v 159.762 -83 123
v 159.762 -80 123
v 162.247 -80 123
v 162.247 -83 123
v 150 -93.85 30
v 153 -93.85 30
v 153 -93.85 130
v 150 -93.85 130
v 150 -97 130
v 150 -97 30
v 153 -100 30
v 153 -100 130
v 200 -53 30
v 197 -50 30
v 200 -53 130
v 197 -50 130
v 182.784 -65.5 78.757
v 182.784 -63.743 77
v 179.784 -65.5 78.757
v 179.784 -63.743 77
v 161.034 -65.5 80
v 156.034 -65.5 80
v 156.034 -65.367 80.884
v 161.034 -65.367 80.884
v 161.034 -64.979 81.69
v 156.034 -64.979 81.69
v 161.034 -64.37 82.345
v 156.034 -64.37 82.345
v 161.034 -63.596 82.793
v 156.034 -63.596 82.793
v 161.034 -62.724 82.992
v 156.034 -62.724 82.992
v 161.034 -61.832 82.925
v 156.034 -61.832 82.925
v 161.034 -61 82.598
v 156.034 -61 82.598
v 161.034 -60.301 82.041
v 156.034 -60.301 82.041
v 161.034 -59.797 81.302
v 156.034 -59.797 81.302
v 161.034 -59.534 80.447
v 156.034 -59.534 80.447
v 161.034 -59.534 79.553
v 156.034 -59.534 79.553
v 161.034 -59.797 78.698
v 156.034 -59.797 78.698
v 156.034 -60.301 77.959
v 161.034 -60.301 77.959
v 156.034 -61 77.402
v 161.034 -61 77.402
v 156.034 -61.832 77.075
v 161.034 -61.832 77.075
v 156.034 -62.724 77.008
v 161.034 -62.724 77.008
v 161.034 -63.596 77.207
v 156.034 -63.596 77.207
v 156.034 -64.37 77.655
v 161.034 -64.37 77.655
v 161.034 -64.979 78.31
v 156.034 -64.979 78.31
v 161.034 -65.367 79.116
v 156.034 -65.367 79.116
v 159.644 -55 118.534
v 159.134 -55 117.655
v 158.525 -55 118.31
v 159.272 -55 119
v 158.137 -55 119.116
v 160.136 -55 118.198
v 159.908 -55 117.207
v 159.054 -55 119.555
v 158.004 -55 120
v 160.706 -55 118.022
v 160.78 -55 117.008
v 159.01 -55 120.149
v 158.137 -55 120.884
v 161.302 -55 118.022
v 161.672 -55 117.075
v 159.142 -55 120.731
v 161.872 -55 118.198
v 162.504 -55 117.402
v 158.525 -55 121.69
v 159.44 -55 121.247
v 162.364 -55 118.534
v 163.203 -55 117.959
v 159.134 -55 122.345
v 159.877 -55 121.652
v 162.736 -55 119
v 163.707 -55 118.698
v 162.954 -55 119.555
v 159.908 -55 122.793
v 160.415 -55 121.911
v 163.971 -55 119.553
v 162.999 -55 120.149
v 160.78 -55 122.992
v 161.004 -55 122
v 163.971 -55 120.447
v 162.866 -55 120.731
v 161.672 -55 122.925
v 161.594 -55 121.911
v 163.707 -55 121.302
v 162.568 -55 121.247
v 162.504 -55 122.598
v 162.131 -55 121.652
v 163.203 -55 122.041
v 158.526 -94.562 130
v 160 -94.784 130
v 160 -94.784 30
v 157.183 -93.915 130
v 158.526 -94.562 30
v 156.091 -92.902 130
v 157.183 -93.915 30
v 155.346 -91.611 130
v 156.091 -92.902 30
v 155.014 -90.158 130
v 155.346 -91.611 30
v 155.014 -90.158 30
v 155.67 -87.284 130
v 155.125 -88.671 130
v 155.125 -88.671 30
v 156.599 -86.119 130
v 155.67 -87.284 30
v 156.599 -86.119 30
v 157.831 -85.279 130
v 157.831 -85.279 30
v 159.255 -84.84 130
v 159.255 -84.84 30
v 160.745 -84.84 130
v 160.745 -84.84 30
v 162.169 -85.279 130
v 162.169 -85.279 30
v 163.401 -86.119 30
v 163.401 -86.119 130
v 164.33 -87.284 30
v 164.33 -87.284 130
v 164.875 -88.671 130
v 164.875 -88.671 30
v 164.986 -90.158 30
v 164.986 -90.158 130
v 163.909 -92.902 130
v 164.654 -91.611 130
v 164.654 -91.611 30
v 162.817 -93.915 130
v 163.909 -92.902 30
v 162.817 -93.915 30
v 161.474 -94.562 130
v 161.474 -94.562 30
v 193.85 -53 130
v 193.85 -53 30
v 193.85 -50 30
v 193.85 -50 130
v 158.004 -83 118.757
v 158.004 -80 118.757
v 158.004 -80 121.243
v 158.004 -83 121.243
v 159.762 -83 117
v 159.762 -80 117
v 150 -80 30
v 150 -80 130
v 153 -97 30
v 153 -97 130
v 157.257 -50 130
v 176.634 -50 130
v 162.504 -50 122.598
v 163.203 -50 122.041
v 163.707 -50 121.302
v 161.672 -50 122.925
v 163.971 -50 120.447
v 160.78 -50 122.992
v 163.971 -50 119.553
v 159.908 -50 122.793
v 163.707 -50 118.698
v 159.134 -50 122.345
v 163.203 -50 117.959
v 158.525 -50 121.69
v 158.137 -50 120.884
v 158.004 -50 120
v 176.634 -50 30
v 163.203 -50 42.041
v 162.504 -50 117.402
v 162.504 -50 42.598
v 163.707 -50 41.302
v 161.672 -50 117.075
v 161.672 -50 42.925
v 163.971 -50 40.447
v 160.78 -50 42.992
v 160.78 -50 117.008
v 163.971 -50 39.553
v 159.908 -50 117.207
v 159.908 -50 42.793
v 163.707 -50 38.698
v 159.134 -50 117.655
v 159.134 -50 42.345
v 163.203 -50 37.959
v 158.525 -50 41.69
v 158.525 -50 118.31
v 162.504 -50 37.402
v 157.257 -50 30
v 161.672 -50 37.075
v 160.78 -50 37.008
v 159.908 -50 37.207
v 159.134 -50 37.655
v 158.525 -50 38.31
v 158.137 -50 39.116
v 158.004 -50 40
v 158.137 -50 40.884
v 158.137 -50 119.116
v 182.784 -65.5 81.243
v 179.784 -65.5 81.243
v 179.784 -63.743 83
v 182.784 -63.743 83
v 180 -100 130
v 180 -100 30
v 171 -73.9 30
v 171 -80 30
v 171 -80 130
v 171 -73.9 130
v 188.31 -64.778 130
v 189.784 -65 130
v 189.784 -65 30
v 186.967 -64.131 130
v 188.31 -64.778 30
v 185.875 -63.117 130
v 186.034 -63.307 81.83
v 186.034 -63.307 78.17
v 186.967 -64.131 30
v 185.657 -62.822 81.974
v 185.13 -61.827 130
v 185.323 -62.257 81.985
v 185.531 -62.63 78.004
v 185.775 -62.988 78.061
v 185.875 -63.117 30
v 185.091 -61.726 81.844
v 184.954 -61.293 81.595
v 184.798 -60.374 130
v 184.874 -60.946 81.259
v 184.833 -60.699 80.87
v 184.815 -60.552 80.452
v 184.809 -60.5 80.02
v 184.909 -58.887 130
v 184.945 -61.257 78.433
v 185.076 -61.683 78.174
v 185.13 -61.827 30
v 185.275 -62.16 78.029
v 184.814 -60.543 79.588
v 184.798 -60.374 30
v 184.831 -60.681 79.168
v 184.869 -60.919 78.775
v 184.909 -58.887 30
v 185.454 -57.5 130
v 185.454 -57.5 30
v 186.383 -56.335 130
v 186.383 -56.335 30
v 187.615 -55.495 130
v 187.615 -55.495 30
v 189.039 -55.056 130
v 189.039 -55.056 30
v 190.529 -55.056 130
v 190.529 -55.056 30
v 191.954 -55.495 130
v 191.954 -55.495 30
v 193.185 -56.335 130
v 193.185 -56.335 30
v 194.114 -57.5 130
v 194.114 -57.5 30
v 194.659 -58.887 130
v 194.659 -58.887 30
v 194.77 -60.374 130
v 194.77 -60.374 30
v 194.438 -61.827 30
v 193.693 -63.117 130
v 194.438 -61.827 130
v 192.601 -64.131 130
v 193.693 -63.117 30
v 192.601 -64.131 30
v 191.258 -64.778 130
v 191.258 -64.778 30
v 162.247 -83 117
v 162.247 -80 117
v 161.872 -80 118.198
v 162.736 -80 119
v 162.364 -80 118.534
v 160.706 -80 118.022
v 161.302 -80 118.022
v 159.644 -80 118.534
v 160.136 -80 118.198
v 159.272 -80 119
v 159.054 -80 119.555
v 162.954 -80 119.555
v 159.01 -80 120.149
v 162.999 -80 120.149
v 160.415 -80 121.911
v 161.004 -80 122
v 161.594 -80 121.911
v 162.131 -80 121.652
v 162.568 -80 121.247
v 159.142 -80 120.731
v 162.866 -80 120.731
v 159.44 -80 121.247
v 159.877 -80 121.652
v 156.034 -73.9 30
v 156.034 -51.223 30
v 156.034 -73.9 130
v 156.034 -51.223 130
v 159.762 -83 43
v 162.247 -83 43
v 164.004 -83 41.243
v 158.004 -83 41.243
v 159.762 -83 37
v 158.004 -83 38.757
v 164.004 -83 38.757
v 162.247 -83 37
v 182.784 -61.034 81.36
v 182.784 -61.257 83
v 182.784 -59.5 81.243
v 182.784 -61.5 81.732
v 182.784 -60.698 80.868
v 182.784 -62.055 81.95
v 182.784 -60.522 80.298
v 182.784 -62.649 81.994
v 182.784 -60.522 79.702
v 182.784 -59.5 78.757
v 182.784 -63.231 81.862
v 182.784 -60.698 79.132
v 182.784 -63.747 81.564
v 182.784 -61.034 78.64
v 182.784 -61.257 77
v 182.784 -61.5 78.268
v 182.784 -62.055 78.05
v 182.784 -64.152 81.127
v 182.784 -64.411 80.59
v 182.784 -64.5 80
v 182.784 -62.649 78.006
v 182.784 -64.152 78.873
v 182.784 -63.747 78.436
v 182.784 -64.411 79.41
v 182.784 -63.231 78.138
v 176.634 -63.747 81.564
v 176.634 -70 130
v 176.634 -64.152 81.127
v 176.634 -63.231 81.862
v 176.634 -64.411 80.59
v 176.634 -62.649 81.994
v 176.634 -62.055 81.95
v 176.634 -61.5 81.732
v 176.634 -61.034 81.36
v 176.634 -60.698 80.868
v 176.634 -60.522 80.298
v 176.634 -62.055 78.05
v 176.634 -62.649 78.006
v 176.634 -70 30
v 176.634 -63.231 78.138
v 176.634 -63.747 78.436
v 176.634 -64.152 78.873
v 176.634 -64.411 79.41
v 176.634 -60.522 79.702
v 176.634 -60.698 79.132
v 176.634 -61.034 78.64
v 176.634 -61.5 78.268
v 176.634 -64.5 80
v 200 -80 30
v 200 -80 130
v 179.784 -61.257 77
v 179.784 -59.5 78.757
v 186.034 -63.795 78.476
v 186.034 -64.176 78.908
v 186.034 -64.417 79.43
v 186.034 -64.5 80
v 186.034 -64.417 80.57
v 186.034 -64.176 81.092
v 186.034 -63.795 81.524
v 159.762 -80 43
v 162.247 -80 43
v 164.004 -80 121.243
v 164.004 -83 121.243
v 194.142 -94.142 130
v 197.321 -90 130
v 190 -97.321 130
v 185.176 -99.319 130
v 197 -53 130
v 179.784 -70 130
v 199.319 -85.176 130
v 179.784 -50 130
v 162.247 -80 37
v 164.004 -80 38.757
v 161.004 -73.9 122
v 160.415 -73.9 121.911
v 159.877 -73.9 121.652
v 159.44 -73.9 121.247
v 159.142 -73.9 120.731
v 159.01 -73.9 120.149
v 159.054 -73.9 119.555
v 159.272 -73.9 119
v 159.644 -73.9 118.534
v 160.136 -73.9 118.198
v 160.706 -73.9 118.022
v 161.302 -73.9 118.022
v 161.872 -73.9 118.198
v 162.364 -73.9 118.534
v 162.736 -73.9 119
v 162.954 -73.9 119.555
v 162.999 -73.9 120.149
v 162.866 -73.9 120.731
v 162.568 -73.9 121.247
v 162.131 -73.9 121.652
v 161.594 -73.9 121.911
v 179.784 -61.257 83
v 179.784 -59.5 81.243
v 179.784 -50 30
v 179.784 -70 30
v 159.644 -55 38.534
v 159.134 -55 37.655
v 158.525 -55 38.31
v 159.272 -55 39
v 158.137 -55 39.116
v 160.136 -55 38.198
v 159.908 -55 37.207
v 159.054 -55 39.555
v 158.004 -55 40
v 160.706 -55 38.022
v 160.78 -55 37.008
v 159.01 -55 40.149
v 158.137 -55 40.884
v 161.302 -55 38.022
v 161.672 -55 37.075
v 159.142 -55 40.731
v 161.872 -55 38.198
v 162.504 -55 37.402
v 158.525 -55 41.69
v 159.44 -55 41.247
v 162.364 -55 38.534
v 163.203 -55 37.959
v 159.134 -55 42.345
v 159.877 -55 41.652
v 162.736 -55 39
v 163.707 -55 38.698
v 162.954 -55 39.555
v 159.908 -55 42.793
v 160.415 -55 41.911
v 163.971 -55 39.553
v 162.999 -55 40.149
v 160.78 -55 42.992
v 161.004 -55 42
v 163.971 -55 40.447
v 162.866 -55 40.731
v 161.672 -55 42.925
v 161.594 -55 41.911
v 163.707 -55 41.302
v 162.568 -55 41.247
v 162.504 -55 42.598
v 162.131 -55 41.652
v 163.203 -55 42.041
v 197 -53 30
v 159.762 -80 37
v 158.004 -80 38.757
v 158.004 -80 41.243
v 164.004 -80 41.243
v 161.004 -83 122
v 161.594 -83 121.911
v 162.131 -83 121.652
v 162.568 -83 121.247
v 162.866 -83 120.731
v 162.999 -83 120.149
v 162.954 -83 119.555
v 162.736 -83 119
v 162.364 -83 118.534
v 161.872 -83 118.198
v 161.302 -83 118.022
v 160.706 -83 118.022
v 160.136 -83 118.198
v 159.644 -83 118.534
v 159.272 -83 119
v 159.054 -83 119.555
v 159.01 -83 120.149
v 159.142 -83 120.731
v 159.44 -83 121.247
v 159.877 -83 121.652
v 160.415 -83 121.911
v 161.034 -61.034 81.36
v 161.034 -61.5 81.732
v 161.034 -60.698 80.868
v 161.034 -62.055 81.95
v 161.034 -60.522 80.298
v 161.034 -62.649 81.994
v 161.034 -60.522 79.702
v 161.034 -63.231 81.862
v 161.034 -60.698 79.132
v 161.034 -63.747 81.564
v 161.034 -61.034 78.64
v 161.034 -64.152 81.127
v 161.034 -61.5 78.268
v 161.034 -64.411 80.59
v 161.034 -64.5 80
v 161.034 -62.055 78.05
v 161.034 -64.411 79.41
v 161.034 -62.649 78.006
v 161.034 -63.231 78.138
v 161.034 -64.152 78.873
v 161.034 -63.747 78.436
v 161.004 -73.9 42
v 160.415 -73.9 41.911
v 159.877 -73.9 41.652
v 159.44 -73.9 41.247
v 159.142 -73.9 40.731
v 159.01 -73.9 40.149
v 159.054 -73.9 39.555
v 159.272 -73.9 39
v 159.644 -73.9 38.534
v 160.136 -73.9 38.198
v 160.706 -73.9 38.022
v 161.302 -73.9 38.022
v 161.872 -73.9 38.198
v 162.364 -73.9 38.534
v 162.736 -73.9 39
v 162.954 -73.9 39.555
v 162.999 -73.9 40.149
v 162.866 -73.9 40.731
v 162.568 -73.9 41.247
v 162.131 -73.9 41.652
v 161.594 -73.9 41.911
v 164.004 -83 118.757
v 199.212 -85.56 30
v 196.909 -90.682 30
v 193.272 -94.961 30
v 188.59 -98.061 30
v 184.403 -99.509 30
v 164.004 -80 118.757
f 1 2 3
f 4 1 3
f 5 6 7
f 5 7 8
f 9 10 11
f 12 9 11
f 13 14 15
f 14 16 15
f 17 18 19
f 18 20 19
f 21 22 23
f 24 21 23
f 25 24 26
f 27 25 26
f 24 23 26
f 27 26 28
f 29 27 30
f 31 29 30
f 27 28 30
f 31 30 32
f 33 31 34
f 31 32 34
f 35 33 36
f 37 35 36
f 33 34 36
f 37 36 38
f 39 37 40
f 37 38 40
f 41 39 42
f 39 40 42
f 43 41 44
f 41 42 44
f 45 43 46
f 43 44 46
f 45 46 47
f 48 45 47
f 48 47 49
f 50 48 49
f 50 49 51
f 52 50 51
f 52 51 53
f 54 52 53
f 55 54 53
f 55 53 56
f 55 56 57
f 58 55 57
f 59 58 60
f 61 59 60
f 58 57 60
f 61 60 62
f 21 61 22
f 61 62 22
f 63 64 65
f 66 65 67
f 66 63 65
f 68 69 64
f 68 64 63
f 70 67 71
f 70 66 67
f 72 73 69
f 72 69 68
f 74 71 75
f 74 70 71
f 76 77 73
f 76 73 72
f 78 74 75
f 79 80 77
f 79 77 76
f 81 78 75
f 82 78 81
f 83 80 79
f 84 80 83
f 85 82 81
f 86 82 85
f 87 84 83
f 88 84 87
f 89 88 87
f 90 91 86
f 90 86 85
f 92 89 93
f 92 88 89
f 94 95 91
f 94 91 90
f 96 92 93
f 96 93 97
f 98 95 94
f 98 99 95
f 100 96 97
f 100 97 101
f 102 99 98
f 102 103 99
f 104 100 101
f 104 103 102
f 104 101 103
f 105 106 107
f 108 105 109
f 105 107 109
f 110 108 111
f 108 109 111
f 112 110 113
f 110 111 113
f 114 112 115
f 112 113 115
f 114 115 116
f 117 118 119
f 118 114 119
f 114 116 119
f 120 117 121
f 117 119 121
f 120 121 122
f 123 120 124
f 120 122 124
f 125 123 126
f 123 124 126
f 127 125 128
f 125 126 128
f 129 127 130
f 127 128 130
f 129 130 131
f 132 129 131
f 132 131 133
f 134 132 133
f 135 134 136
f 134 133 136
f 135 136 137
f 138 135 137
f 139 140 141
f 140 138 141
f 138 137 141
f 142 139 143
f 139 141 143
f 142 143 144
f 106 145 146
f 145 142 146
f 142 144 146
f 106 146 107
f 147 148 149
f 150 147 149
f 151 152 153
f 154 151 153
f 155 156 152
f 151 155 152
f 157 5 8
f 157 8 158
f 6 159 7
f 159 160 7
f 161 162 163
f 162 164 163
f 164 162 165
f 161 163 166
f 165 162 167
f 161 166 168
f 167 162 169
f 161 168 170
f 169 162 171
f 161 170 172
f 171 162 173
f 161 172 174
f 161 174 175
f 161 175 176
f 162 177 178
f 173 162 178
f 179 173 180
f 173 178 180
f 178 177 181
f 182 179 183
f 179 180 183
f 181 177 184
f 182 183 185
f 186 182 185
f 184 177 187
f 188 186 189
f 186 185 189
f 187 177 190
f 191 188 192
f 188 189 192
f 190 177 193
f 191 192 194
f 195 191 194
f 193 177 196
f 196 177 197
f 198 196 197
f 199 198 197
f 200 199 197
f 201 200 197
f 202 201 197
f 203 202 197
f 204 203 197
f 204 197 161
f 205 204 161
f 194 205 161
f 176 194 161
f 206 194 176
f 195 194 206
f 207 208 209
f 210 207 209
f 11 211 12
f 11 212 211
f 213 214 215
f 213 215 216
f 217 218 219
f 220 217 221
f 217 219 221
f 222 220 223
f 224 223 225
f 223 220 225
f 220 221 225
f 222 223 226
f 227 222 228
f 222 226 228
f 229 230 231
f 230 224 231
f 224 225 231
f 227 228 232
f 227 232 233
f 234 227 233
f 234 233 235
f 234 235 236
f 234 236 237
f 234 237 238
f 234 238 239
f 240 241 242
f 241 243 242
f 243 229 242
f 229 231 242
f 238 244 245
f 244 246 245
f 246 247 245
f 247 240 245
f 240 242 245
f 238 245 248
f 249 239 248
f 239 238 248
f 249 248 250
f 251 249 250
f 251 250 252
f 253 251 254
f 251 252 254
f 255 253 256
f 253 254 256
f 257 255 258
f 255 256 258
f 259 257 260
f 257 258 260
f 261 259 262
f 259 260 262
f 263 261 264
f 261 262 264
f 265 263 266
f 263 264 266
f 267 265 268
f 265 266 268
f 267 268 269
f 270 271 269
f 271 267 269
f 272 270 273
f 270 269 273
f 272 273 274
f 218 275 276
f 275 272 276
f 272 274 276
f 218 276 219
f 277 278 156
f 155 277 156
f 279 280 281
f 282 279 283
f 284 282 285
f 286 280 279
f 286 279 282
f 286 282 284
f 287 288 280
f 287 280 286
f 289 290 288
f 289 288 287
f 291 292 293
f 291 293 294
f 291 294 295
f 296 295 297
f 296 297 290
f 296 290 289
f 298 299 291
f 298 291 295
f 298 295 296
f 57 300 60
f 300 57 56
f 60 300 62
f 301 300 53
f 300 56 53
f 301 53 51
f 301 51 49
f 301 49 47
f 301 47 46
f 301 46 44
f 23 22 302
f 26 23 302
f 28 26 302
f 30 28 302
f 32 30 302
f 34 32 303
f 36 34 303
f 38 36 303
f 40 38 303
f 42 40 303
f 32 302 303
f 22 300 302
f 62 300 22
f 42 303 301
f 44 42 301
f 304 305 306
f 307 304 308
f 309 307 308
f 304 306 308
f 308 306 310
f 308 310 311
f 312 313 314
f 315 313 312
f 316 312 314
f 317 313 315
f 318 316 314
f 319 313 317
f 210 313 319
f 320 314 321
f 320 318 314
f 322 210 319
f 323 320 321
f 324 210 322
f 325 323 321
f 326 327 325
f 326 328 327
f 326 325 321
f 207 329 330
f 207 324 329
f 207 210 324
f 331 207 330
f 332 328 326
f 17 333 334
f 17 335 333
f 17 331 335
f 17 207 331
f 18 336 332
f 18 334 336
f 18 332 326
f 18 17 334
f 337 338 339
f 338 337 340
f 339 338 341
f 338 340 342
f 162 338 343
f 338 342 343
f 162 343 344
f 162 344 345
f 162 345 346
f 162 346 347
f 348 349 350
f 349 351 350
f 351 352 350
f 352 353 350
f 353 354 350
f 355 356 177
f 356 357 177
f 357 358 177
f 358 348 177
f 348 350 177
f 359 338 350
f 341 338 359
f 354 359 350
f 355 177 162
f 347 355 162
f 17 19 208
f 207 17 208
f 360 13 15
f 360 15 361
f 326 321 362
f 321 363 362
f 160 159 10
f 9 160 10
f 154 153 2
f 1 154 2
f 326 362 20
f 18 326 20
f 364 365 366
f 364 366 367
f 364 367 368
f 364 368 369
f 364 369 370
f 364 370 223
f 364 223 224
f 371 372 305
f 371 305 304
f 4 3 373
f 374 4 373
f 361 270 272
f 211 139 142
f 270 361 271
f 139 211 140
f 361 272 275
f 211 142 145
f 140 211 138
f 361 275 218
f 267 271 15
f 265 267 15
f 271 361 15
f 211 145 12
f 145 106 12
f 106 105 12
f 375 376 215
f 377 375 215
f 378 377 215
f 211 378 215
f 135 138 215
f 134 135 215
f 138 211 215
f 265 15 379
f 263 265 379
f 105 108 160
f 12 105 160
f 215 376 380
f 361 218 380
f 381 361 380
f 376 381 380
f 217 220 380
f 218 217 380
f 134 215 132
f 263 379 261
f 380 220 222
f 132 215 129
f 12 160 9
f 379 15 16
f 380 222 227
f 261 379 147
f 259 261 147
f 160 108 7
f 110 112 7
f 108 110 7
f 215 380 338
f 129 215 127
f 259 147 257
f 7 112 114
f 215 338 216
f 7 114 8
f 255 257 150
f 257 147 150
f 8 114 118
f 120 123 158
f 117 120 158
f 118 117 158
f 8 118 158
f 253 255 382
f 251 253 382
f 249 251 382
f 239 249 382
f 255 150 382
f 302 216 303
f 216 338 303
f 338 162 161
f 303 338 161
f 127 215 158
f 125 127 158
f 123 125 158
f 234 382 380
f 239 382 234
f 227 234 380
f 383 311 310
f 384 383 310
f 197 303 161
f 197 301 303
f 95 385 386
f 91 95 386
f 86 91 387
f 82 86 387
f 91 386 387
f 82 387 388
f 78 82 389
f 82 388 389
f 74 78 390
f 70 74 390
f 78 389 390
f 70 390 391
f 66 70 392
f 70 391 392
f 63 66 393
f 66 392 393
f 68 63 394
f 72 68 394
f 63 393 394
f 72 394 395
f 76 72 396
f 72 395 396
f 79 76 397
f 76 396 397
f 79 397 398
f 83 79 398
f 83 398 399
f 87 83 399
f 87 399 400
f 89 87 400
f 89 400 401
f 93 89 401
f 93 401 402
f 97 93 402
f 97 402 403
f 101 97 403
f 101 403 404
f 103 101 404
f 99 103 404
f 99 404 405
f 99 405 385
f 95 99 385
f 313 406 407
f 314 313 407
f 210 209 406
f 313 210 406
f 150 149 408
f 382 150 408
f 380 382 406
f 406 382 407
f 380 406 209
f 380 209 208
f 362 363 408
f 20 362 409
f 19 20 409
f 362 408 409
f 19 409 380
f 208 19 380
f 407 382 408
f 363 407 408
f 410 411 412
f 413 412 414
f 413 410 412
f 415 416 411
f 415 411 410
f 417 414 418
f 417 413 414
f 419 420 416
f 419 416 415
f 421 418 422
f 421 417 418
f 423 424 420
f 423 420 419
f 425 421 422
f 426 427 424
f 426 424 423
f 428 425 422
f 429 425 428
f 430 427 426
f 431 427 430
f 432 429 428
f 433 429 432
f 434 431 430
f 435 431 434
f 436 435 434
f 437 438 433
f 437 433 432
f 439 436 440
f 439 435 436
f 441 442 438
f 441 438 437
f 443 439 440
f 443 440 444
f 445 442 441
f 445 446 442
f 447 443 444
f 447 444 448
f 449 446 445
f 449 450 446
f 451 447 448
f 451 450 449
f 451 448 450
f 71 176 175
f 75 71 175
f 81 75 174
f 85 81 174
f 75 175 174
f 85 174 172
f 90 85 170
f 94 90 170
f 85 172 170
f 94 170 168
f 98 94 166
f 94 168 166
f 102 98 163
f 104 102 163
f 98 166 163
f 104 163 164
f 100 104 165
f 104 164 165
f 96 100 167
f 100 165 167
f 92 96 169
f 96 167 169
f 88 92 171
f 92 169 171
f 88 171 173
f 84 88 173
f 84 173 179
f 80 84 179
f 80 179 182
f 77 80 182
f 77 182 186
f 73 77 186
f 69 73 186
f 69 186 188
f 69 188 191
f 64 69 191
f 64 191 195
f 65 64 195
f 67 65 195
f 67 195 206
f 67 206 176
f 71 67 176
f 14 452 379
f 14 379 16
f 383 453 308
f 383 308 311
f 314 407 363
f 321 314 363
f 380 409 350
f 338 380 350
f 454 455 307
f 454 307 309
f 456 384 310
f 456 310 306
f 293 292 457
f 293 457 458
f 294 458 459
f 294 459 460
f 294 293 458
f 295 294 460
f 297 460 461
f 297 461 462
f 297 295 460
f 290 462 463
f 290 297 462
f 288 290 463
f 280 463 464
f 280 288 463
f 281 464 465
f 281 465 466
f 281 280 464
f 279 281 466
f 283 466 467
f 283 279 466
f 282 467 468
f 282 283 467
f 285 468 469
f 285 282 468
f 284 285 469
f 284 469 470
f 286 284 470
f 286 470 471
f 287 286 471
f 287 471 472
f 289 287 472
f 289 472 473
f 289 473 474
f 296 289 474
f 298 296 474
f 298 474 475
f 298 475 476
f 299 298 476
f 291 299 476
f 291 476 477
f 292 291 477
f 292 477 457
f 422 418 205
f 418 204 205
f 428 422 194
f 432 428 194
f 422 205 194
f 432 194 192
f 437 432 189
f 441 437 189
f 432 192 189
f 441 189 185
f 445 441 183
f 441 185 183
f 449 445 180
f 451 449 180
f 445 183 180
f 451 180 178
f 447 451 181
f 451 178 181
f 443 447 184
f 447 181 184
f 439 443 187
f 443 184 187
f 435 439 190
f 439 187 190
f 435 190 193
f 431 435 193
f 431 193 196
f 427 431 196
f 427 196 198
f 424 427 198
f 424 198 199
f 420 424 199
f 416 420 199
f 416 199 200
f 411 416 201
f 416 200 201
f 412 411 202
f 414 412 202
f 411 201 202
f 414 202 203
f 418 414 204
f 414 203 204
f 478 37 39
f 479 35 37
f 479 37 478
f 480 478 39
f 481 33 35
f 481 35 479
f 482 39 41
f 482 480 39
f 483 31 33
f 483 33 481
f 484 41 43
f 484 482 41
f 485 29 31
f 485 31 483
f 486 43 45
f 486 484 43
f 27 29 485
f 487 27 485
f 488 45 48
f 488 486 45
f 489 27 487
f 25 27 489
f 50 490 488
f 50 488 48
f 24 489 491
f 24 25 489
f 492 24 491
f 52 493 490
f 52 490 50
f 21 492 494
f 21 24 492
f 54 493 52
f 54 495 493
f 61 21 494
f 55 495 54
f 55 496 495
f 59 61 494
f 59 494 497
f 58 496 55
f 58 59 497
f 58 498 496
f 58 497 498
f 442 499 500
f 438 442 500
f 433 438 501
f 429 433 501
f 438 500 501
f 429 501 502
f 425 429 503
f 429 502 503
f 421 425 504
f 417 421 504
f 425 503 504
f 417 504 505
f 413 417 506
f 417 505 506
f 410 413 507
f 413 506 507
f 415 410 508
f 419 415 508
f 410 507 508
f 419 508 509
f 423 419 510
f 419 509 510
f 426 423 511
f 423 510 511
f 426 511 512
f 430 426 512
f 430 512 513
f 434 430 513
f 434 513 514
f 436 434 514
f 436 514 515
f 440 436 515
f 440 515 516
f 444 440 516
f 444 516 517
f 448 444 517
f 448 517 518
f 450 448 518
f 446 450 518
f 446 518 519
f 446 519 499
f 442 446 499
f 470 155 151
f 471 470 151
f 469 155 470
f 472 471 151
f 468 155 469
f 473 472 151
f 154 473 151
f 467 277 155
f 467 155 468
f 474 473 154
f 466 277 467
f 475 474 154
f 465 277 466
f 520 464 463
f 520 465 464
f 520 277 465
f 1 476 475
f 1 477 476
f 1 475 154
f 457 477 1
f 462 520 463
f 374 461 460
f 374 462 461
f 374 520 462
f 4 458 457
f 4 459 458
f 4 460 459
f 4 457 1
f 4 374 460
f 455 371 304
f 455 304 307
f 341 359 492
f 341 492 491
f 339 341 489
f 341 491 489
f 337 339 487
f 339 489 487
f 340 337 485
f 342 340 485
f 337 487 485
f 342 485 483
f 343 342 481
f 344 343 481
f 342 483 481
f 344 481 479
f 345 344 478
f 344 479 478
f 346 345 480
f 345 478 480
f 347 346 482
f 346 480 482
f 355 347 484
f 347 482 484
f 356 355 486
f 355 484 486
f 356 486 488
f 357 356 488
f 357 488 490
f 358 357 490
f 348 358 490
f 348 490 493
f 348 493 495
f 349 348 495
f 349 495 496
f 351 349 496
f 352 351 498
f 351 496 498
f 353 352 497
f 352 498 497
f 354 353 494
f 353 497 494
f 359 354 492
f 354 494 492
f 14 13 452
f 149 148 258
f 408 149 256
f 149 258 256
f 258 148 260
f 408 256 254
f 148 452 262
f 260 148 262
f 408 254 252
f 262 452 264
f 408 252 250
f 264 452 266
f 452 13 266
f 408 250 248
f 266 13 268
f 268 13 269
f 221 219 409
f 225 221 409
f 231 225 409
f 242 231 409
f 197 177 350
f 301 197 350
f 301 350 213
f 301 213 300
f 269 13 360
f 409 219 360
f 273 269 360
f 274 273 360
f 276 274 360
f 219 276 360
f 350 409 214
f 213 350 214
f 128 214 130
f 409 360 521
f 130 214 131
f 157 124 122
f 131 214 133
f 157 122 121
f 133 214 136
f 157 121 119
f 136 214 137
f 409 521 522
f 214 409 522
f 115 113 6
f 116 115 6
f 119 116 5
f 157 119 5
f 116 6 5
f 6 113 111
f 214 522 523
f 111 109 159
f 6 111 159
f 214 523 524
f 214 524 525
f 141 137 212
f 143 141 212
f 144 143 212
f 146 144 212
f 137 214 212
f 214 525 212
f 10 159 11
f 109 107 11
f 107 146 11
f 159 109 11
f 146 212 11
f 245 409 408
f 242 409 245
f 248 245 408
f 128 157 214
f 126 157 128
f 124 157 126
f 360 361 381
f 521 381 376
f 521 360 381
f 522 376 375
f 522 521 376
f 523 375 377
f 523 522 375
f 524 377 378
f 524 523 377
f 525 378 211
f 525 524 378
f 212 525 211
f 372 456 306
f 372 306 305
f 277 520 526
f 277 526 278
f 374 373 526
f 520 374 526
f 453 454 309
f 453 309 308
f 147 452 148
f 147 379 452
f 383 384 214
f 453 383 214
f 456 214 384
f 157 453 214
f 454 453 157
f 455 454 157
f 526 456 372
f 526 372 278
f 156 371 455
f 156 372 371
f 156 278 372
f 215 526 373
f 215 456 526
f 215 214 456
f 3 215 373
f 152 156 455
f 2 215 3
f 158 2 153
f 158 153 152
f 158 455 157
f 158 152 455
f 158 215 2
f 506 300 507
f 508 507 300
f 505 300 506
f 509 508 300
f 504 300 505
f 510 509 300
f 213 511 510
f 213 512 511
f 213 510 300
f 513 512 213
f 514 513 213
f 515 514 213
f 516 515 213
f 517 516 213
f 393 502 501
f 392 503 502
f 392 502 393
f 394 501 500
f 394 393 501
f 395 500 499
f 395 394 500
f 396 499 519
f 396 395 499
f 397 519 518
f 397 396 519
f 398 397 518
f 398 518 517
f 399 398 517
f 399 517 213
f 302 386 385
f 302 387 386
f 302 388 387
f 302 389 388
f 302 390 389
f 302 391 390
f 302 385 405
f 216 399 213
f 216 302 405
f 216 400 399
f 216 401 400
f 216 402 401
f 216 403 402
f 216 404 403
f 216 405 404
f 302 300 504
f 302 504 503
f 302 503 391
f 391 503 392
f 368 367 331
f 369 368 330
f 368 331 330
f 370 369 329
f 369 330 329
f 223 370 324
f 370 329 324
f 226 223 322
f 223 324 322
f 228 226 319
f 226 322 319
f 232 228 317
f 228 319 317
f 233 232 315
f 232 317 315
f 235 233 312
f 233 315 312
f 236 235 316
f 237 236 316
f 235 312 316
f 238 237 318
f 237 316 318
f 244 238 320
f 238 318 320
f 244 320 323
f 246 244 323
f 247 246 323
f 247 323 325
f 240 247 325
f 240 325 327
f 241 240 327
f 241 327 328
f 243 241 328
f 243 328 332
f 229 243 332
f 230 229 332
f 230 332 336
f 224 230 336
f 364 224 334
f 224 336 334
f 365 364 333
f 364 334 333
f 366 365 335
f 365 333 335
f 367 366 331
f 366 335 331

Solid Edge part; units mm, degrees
sketch "Sketch1" plane through (0, 0, 0) normal (0, 0, -1) x (-1, 0, 0)
  line L0 (-200, -100) -> (200, -100)
  line L1 (200, -100) -> (200, 100)
  line L2 (200, 100) -> (-200, 100)
  line L3 (-200, 100) -> (-200, -100)
  dimension "D1" = 400
  dimension "D2" = 200
extrude "Protrusion1" add sketch "Sketch1" against normal blind 250
sketch "Sketch2" plane through (0, 0, 0) normal (0, 0, -1) x (-1, 0, 0)
  circle A0 centre (100, 0) radius 50
  dimension "D1" = 160
  dimension "D2" = 100
  dimension "D3" = 100
  dimension "D4" = 100
  dimension "D5" = 200
extrude "Cutout1" cut sketch "Sketch2" against normal blind 3
fillet "Round_8" radius 20 4 edges at (200, -100, 125) (200, 100, 125) (-200, 100, 125) (-200, -100, 125)
fillet "Round_9" radius 30 8 edges at (0, -100, 0) (-194.1421, -94.1421, 0) (-200, 0, 0) (-194.1421, 94.1421, 0) (0, 100, 0) (194.1421, 94.1421, 0) (200, 0, 0) (194.1421, -94.1421, 0)
sketch "Sketch3" plane through (200, 0, 140) normal (1, 0, 0) x (0, -1, 0)
  line L0 (70, 57.1371) -> (-70, 57.1371)
  line L1 (-70, 57.1371) -> (-70, 97.1371)
  line L2 (-70, 97.1371) -> (70, 97.1371)
  line L3 (70, 97.1371) -> (70, 57.1371)
  dimension "D1" = 160
  dimension "D2" = 140
  dimension "D3" = 40
  dimension "D4" = 10
  dimension "D5" = 160
extrude "ExtrudedCutout_37" cut sketch "Sketch3" against normal blind 30
sketch "Sketch4" plane through (185, 0, 82.8629) normal (0, 0, -1) x (0, -1, 0)
  line L0 (-70, 15) -> (70, 15)
  line L1 (70, 15) -> (70, 10)
  line L2 (70, 10) -> (-70, 10)
  line L3 (-70, 10) -> (-70, 15)
  dimension "D1" = 140
  dimension "D2" = 5
extrude "Cutout2" cut sketch "Sketch4" against normal blind 5
sketch "Sketch5" plane through (185, 0, 42.8629) normal (0, 0, 1) x (0, -1, 0)
  line L0 (-70, -10) -> (70, -10)
  line L1 (70, -10) -> (70, -15)
  line L2 (70, -15) -> (-70, -15)
  line L3 (-70, -15) -> (-70, -10)
  dimension "D1" = 140
  dimension "D2" = 5
extrude "ExtrudedCutout_39" cut sketch "Sketch5" against normal blind 5
sketch "Sketch6" plane through (185, 70, 62.8629) normal (0, -1, 0) x (1, 0, 0)
  line L0 (-15, 25) -> (-10, 25)
  line L1 (-10, 25) -> (-10, -25)
  line L2 (-10, -25) -> (-15, -25)
  line L3 (-15, -25) -> (-15, 25)
  dimension "D1" = 5
  dimension "D2" = 50
extrude "Cutout3" cut sketch "Sketch6" against normal blind 5
sketch "Sketch7" plane through (185, -70, 62.8629) normal (0, 1, 0) x (1, 0, 0)
  line L0 (-15, 25) -> (-10, 25)
  line L1 (-10, 25) -> (-10, -25)
  line L2 (-10, -25) -> (-15, -25)
  line L3 (-15, -25) -> (-15, 25)
  dimension "D1" = 5
  dimension "D2" = 50
extrude "Cutout4" cut sketch "Sketch7" against normal blind 5
sketch "Sketch8" plane through (170, 0, 62.8629) normal (1, 0, 0) x (0, -1, 0)
  line L0 (-75, 25) -> (75, 25)
  line L1 (75, 25) -> (75, -25)
  line L2 (75, -25) -> (-75, -25)
  line L3 (-75, -25) -> (-75, 25)
  line L4 (72, 22.1284) -> (-72, 22.1284)
  line L5 (-72, 22.1284) -> (-72, -21.8716)
  line L6 (-72, -21.8716) -> (72, -21.8716)
  line L7 (72, -21.8716) -> (72, 22.1284)
  dimension "D1" = 150
  dimension "D2" = 50
  dimension "D3" = 144
  dimension "D4" = 44
  dimension "D5" = 3
  dimension "D6" = 150
extrude "ExtrudedCutout_42" cut sketch "Sketch8" along normal mid plane 10
sketch "Sketch9" plane through (200, 0, 140) normal (1, 0, 0) x (0, -1, 0)
  circle A0 centre (0, -30) radius 68.3204
  dimension "D1" = 136.6408
  dimension "D2" = 80
extrude "Cutout5" cut sketch "Sketch9" against normal blind 6
sketch "Sketch10" plane through (0, 0, 250) normal (0, 0, 1) x (-1, 0, 0)
  line L0 (-180, 100) -> (180, 100)
  line L1 (180, 100) -> (180, 97)
  line L2 (180, 97) -> (-180, 97)
  line L3 (-180, 97) -> (-180, 100)
  line L4 (200, 80) -> (197, 80)
  line L5 (197, 80) -> (197, -80)
  line L6 (197, -80) -> (200, -80)
  line L7 (200, -80) -> (200, 80)
  line L8 (-200, 80) -> (-197, 80)
  line L9 (-197, 80) -> (-197, -80)
  line L10 (-197, -80) -> (-200, -80)
  line L11 (-200, -80) -> (-200, 80)
  line L12 (-180, -100) -> (180, -100)
  line L13 (180, -100) -> (180, -97)
  line L14 (180, -97) -> (-180, -97)
  line L15 (-180, -97) -> (-180, -100)
  dimension "D1" = 360
  dimension "D2" = 3
  dimension "D3" = 3
  dimension "D4" = 160
extrude "Cutout6" cut sketch "Sketch10" against normal blind 220
sketch "Sketch11" plane through (165, -97, 140) normal (0, -1, 0) x (0, 0, 1)
  line L0 (-110, 23.978) -> (116.0147, 23.978)
  line L1 (116.0147, 23.978) -> (116.0147, -38.9945)
  line L2 (116.0147, -38.9945) -> (-110, -38.9945)
  line L3 (-110, -38.9945) -> (-110, 23.978)
  dimension "D1" = 226.0147
  dimension "D2" = 62.9725
extrude "ExtrudedCutout_47" cut sketch "Sketch11" along normal mid plane 474
sketch "Sketch12" plane through (0, 0, 0) normal (0, 0, -1) x (-1, 0, 0)
  line L0 (-150, -121.4584) -> (-150, -50)
  line L1 (-254.1695, -50) -> (-150, -50)
  line L2 (-254.1695, -50) -> (-254.1695, 113.1592)
  line L3 (-254.1695, 113.1592) -> (264.7141, 113.1592)
  line L4 (264.7141, 113.1592) -> (271.856, -149.5027)
  line L5 (271.856, -149.5027) -> (-150, -121.4584)
  dimension "D1" = 104.1695
  dimension "D2" = 350
  dimension "D3" = 150
  dimension "D4" = 163.1592
  dimension "D5" = 518.8836
  dimension "D6" = 262.759
  dimension "D7" = 422.7871
extrude "ExtrudedCutout_46" cut sketch "Sketch12" against normal blind 317
sketch "Sketch13" plane through (175, -75, 30) normal (0, 0, 1) x (0, 1, 0)
  line L0 (17.7429, 25) -> (30.7571, 11.9857)
  line L1 (29.3143, 29.7) -> (30.7571, 11.9857)
  line L2 (17.7429, 25) -> (29.3143, 29.7)
  dimension "D1" = 18.405
  dimension "D2" = 12.4895
  dimension "D3" = 17.773
extrude "Cutout7" cut sketch "Sketch13" against normal blind 15
sketch "Sketch14" plane through (153.6286, -53.6286, 22.5) normal (-0.7071, 0.7071, 0) x (0.7071, 0.7071, 0)
  line L0 (-5.1316, -2.5) -> (5.1316, -2.5)
  line L1 (5.1316, 2.97) -> (5.1316, -2.5)
  line L2 (-5.1316, 2.97) -> (5.1316, 2.97)
  line L3 (-5.1316, 2.97) -> (-5.1316, -2.5)
  dimension "D1" = 10.2631
  dimension "D2" = 5
  dimension "D3" = 10.2631
  dimension "D4" = 5.47
  dimension "D5" = 5.47
extrude "ExtrudedCutout_49" cut sketch "Sketch14" against normal blind 46
sketch "Sketch15" plane through (175, -75, 30) normal (0, 0, 1) x (0, -1, 0)
  circle A0 centre (-17.7429, -17.7429) radius 1.5
  dimension "D1" = 3
extrude "ExtrudedCutout_50" cut sketch "Sketch15" against normal blind 9
sketch "Sketch16" plane through (175, -75, 30) normal (0, 0, 1) x (0, -1, 0)
  line L0 (5, -20) -> (-3, -20)
  line L1 (-3, -20) -> (-3, -15)
  line L2 (5, -15) -> (-3, -15)
  line L3 (5, -20) -> (5, -15)
  line L4 (-20, 5) -> (-20, -3)
  line L5 (-20, -3) -> (-15, -3)
  line L6 (-15, 5) -> (-15, -3)
  line L7 (-20, 5) -> (-15, 5)
  dimension "D1" = 8
  dimension "D2" = 5
  dimension "D3" = 5
  dimension "D4" = 20
  dimension "D5" = 20
  dimension "D6" = 8
  dimension "D7" = 5
extrude "Cutout8" cut sketch "Sketch16" against normal blind 10
sketch "Sketch17" plane through (175, -50, 15) normal (0, 1, 0) x (0, 0, 1)
  circle A0 centre (10, 1) radius 1.5
extrude "Cutout9" cut sketch "Sketch17" against normal blind 8
sketch "Sketch18" plane through (150, -75, 15) normal (-1, 0, 0) x (0, -1, 0)
  circle A0 centre (1.0029, 10) radius 1.5
extrude "Cutout10" cut sketch "Sketch18" against normal blind 9
sketch "Sketch19" plane through (150, -75, 15) normal (-1, 0, 0) x (0, -1, 0)
  circle A0 centre (-17, -7) radius 5
  circle A1 centre (14.7841, 4.53) radius 5
extrude "Cutout11" cut sketch "Sketch19" against normal blind 2
sketch "Sketch20" plane through (175, -50, 15) normal (0, 1, 0) x (-1, 0, 0)
  circle A0 centre (17, -7) radius 5
  circle A1 centre (-14.7841, 4.53) radius 5
extrude "Cutout12" cut sketch "Sketch20" against normal blind 2
fillet "Round_16" radius 5 1 edges at (153.6286, -53.6286, 15)
sketch "Sketch21" plane through (175, -75, 30) normal (0, 0, 1) x (0, -1, 0)
  circle A0 centre (-15, 14.7841) radius 5
  circle A1 centre (14.7841, -15) radius 5
extrude "ExtrudedCutout_56" cut sketch "Sketch21" against normal blind 3
sketch "Sketch22" plane through (169.892, -69.892, 19.53) normal (0, 0, 1) x (0.7071, -0.7071, 0)
  line L0 (23, 5.1316) -> (-12.8442, 5.1316)
  line L1 (-12.8442, 5.1316) -> (-12.8442, -5.1316)
  line L2 (-12.8442, -5.1316) -> (23, -5.1316)
  line L3 (23, -5.1316) -> (23, 5.1316)
  dimension "D1" = 35.8442
  dimension "D2" = 10.2631
extrude "ExtrudedProtrusion_20" add sketch "Sketch22" along normal blind 6
sketch "Sketch23" plane through (175, -75, 30) normal (0, 0, 1) x (0, -1, 0)
  arc A0 (5, 25) -> (25, 5) centre (5, 5) cw
  line L0 (25, 5) -> (25, -25)
  line L1 (25, -25) -> (-17.7429, -25)
  line L2 (-17.7429, -25) -> (-25, -17.7429)
  line L3 (-25, -17.7429) -> (-25, 25)
  line L4 (-25, 25) -> (5, 25)
  circle A1 centre (-15, 14.7841) radius 5
  circle A2 centre (14.7841, -15) radius 5
extrude "Protrusion2" add sketch "Sketch23" along normal blind 100
sketch "Sketch24" plane through (153.6286, -53.6286, 77.5) normal (-0.7071, 0.7071, 0) x (0, 0, 1)
  line L0 (-47.5, -40.0408) -> (-85.2138, -40.0408)
  line L1 (-85.2138, -40.0408) -> (-85.2138, 45.7641)
  line L2 (-85.2138, 45.7641) -> (-47.5, 45.7641)
  line L3 (-47.5, 45.7641) -> (-47.5, -40.0408)
  dimension "D1" = 37.7138
  dimension "D2" = 85.805
extrude "ExtrudedCutout_57" cut sketch "Sketch24" along normal mid plane 148
sketch "Sketch25" plane through (175, -75, 130) normal (0, 0, 1) x (0, -1, 0)
  line L0 (-22, 22) -> (-22, 18.85)
  line L1 (-22, 18.85) -> (-25, 18.85)
  line L2 (-29.2429, 28.0796) -> (-25, 18.85)
  line L3 (-22, 28.0796) -> (-29.2429, 28.0796)
  line L4 (-22, 25) -> (-22, 28.0796)
  line L5 (-25, 22) -> (-22, 25)
  line L6 (-22, 22) -> (-25, 22)
  line L7 (22, -22) -> (18.85, -22)
  line L8 (18.85, -22) -> (18.85, -25)
  line L9 (28.0796, -29.2429) -> (18.85, -25)
  line L10 (28.0796, -22) -> (28.0796, -29.2429)
  line L11 (25, -22) -> (28.0796, -22)
  line L12 (22, -25) -> (25, -22)
  line L13 (22, -22) -> (22, -25)
  dimension "D1" = 3.15
  dimension "D2" = 3
  dimension "D3" = 3
  dimension "D4" = 3
  dimension "D5" = 3
  dimension "D6" = 4.2426
  dimension "D7" = 3.0796
  dimension "D8" = 7.2429
extrude "Cutout13" cut sketch "Sketch25" against normal blind 148
sketch "Sketch26" plane through (175, -75, 130) normal (0, 0, 1) x (0, -1, 0)
  line L0 (5, -4) -> (5, -25)
  line L1 (5, -25) -> (-1.1, -25)
  line L2 (-1.1, -25) -> (-1.1, -4)
  line L3 (5, -4) -> (-1.1, -4)
  dimension "D1" = 21
  dimension "D2" = 20
  dimension "D3" = 6.1
  dimension "D4" = 21
extrude "ExtrudedCutout_60" cut sketch "Sketch26" against normal blind 186
sketch "Sketch27" plane through (160, -80, 80) normal (0, 1, 0) x (0, 0, 1)
  line L0 (-38.7574, -1.9959) -> (-41.2426, -1.9959)
  line L1 (-41.2426, -1.9959) -> (-43, -0.2385)
  line L2 (-43, -0.2385) -> (-43, 2.2467)
  line L3 (-43, 2.2467) -> (-41.2426, 4.0041)
  line L4 (-41.2426, 4.0041) -> (-38.7574, 4.0041)
  line L5 (-38.7574, 4.0041) -> (-37, 2.2467)
  line L6 (-37, 2.2467) -> (-37, -0.2385)
  line L7 (-37, -0.2385) -> (-38.7574, -1.9959)
  line L8 (38.7574, -1.9959) -> (41.2426, -1.9959)
  line L9 (41.2426, -1.9959) -> (43, -0.2385)
  line L10 (43, -0.2385) -> (43, 2.2467)
  line L11 (43, 2.2467) -> (41.2426, 4.0041)
  line L12 (41.2426, 4.0041) -> (38.7574, 4.0041)
  line L13 (38.7574, 4.0041) -> (37, 2.2467)
  line L14 (37, 2.2467) -> (37, -0.2385)
  line L15 (37, -0.2385) -> (38.7574, -1.9959)
  circle A0 centre (40, 1.0041) radius 2
extrude "Cutout14" cut sketch "Sketch27" against normal blind 3
sketch "Sketch28" plane through (160, -80, 80) normal (0, 1, 0) x (0, 0, 1)
  circle A0 centre (-40, 1.0041) radius 2
  circle A1 centre (40, 1.0041) radius 2
extrude "ExtrudedCutout_62" cut sketch "Sketch28" along normal blind 43
sketch "Sketch29" plane through (177.0686, -50, 80) normal (0, 1, 0) x (-1, 0, 0)
  circle A0 centre (16.0645, 40) radius 3
  circle A1 centre (16.0645, -40) radius 3
  dimension "D1" = 6
  dimension "D2" = 6
  dimension "D3" = 77
extrude "Cutout15" cut sketch "Sketch29" against normal blind 5
sketch "Sketch30" plane through (175, -75, 130) normal (0, 0, 1) x (0, -1, 0)
  line L0 (-1.1, -18.9657) -> (-27.9226, -18.9657)
  line L1 (-27.9226, -18.9657) -> (-17.7429, -25)
  line L2 (-17.7429, -25) -> (-1.1, -25)
  line L3 (-1.1, -25) -> (-1.1, -18.9657)
  dimension "D1" = 26.8226
  dimension "D2" = 11.8338
extrude "Cutout16" cut sketch "Sketch30" against normal blind 148
sketch "Sketch31" plane through (175, -75, 30) normal (0, 0, -1) x (0, 1, 0)
  line L0 (25, 4.7841) -> (5, 4.7841)
  line L1 (5, 4.7841) -> (5, 1.6341)
  line L2 (5, 1.6341) -> (25, 1.6341)
  line L3 (25, 1.6341) -> (25, 4.7841)
  dimension "D1" = 20
  dimension "D2" = 3.15
  dimension "D3" = 10
extrude "Cutout17" cut sketch "Sketch31" against normal blind 246
sketch "Sketch32" plane through (156.0343, -62.5614, 80) normal (-1, 0, 0) x (0, -1, 0)
  circle A0 centre (-0.0614, 0) radius 2
  dimension "D1" = 5
  dimension "D2" = 4
extrude "Cutout18" cut sketch "Sketch32" against normal blind 30
sketch "Sketch33" plane through (156.0343, -62.5614, 80) normal (-1, 0, 0) x (0, -1, 0)
  circle A0 centre (-0.0614, 0) radius 3
  dimension "D1" = 6
extrude "Cutout19" cut sketch "Sketch33" against normal blind 5
sketch "Sketch34" plane through (179.7841, -60, 80) normal (-1, 0, 0) x (0, 0, 1)
  line L0 (3, -3.7426) -> (3, -1.2574)
  line L1 (3, -1.2574) -> (1.2426, 0.5)
  line L2 (1.2426, 0.5) -> (-1.2426, 0.5)
  line L3 (-1.2426, 0.5) -> (-3, -1.2574)
  line L4 (-3, -1.2574) -> (-3, -3.7426)
  line L5 (-3, -3.7426) -> (-1.2426, -5.5)
  line L6 (-1.2426, -5.5) -> (1.2426, -5.5)
  line L7 (1.2426, -5.5) -> (3, -3.7426)
  dimension "D1" = 2.4853
  dimension "D2" = 2.4853
  dimension "D3" = 2.4853
  dimension "D4" = 2.4853
extrude "Cutout20" cut sketch "Sketch34" against normal blind 3
